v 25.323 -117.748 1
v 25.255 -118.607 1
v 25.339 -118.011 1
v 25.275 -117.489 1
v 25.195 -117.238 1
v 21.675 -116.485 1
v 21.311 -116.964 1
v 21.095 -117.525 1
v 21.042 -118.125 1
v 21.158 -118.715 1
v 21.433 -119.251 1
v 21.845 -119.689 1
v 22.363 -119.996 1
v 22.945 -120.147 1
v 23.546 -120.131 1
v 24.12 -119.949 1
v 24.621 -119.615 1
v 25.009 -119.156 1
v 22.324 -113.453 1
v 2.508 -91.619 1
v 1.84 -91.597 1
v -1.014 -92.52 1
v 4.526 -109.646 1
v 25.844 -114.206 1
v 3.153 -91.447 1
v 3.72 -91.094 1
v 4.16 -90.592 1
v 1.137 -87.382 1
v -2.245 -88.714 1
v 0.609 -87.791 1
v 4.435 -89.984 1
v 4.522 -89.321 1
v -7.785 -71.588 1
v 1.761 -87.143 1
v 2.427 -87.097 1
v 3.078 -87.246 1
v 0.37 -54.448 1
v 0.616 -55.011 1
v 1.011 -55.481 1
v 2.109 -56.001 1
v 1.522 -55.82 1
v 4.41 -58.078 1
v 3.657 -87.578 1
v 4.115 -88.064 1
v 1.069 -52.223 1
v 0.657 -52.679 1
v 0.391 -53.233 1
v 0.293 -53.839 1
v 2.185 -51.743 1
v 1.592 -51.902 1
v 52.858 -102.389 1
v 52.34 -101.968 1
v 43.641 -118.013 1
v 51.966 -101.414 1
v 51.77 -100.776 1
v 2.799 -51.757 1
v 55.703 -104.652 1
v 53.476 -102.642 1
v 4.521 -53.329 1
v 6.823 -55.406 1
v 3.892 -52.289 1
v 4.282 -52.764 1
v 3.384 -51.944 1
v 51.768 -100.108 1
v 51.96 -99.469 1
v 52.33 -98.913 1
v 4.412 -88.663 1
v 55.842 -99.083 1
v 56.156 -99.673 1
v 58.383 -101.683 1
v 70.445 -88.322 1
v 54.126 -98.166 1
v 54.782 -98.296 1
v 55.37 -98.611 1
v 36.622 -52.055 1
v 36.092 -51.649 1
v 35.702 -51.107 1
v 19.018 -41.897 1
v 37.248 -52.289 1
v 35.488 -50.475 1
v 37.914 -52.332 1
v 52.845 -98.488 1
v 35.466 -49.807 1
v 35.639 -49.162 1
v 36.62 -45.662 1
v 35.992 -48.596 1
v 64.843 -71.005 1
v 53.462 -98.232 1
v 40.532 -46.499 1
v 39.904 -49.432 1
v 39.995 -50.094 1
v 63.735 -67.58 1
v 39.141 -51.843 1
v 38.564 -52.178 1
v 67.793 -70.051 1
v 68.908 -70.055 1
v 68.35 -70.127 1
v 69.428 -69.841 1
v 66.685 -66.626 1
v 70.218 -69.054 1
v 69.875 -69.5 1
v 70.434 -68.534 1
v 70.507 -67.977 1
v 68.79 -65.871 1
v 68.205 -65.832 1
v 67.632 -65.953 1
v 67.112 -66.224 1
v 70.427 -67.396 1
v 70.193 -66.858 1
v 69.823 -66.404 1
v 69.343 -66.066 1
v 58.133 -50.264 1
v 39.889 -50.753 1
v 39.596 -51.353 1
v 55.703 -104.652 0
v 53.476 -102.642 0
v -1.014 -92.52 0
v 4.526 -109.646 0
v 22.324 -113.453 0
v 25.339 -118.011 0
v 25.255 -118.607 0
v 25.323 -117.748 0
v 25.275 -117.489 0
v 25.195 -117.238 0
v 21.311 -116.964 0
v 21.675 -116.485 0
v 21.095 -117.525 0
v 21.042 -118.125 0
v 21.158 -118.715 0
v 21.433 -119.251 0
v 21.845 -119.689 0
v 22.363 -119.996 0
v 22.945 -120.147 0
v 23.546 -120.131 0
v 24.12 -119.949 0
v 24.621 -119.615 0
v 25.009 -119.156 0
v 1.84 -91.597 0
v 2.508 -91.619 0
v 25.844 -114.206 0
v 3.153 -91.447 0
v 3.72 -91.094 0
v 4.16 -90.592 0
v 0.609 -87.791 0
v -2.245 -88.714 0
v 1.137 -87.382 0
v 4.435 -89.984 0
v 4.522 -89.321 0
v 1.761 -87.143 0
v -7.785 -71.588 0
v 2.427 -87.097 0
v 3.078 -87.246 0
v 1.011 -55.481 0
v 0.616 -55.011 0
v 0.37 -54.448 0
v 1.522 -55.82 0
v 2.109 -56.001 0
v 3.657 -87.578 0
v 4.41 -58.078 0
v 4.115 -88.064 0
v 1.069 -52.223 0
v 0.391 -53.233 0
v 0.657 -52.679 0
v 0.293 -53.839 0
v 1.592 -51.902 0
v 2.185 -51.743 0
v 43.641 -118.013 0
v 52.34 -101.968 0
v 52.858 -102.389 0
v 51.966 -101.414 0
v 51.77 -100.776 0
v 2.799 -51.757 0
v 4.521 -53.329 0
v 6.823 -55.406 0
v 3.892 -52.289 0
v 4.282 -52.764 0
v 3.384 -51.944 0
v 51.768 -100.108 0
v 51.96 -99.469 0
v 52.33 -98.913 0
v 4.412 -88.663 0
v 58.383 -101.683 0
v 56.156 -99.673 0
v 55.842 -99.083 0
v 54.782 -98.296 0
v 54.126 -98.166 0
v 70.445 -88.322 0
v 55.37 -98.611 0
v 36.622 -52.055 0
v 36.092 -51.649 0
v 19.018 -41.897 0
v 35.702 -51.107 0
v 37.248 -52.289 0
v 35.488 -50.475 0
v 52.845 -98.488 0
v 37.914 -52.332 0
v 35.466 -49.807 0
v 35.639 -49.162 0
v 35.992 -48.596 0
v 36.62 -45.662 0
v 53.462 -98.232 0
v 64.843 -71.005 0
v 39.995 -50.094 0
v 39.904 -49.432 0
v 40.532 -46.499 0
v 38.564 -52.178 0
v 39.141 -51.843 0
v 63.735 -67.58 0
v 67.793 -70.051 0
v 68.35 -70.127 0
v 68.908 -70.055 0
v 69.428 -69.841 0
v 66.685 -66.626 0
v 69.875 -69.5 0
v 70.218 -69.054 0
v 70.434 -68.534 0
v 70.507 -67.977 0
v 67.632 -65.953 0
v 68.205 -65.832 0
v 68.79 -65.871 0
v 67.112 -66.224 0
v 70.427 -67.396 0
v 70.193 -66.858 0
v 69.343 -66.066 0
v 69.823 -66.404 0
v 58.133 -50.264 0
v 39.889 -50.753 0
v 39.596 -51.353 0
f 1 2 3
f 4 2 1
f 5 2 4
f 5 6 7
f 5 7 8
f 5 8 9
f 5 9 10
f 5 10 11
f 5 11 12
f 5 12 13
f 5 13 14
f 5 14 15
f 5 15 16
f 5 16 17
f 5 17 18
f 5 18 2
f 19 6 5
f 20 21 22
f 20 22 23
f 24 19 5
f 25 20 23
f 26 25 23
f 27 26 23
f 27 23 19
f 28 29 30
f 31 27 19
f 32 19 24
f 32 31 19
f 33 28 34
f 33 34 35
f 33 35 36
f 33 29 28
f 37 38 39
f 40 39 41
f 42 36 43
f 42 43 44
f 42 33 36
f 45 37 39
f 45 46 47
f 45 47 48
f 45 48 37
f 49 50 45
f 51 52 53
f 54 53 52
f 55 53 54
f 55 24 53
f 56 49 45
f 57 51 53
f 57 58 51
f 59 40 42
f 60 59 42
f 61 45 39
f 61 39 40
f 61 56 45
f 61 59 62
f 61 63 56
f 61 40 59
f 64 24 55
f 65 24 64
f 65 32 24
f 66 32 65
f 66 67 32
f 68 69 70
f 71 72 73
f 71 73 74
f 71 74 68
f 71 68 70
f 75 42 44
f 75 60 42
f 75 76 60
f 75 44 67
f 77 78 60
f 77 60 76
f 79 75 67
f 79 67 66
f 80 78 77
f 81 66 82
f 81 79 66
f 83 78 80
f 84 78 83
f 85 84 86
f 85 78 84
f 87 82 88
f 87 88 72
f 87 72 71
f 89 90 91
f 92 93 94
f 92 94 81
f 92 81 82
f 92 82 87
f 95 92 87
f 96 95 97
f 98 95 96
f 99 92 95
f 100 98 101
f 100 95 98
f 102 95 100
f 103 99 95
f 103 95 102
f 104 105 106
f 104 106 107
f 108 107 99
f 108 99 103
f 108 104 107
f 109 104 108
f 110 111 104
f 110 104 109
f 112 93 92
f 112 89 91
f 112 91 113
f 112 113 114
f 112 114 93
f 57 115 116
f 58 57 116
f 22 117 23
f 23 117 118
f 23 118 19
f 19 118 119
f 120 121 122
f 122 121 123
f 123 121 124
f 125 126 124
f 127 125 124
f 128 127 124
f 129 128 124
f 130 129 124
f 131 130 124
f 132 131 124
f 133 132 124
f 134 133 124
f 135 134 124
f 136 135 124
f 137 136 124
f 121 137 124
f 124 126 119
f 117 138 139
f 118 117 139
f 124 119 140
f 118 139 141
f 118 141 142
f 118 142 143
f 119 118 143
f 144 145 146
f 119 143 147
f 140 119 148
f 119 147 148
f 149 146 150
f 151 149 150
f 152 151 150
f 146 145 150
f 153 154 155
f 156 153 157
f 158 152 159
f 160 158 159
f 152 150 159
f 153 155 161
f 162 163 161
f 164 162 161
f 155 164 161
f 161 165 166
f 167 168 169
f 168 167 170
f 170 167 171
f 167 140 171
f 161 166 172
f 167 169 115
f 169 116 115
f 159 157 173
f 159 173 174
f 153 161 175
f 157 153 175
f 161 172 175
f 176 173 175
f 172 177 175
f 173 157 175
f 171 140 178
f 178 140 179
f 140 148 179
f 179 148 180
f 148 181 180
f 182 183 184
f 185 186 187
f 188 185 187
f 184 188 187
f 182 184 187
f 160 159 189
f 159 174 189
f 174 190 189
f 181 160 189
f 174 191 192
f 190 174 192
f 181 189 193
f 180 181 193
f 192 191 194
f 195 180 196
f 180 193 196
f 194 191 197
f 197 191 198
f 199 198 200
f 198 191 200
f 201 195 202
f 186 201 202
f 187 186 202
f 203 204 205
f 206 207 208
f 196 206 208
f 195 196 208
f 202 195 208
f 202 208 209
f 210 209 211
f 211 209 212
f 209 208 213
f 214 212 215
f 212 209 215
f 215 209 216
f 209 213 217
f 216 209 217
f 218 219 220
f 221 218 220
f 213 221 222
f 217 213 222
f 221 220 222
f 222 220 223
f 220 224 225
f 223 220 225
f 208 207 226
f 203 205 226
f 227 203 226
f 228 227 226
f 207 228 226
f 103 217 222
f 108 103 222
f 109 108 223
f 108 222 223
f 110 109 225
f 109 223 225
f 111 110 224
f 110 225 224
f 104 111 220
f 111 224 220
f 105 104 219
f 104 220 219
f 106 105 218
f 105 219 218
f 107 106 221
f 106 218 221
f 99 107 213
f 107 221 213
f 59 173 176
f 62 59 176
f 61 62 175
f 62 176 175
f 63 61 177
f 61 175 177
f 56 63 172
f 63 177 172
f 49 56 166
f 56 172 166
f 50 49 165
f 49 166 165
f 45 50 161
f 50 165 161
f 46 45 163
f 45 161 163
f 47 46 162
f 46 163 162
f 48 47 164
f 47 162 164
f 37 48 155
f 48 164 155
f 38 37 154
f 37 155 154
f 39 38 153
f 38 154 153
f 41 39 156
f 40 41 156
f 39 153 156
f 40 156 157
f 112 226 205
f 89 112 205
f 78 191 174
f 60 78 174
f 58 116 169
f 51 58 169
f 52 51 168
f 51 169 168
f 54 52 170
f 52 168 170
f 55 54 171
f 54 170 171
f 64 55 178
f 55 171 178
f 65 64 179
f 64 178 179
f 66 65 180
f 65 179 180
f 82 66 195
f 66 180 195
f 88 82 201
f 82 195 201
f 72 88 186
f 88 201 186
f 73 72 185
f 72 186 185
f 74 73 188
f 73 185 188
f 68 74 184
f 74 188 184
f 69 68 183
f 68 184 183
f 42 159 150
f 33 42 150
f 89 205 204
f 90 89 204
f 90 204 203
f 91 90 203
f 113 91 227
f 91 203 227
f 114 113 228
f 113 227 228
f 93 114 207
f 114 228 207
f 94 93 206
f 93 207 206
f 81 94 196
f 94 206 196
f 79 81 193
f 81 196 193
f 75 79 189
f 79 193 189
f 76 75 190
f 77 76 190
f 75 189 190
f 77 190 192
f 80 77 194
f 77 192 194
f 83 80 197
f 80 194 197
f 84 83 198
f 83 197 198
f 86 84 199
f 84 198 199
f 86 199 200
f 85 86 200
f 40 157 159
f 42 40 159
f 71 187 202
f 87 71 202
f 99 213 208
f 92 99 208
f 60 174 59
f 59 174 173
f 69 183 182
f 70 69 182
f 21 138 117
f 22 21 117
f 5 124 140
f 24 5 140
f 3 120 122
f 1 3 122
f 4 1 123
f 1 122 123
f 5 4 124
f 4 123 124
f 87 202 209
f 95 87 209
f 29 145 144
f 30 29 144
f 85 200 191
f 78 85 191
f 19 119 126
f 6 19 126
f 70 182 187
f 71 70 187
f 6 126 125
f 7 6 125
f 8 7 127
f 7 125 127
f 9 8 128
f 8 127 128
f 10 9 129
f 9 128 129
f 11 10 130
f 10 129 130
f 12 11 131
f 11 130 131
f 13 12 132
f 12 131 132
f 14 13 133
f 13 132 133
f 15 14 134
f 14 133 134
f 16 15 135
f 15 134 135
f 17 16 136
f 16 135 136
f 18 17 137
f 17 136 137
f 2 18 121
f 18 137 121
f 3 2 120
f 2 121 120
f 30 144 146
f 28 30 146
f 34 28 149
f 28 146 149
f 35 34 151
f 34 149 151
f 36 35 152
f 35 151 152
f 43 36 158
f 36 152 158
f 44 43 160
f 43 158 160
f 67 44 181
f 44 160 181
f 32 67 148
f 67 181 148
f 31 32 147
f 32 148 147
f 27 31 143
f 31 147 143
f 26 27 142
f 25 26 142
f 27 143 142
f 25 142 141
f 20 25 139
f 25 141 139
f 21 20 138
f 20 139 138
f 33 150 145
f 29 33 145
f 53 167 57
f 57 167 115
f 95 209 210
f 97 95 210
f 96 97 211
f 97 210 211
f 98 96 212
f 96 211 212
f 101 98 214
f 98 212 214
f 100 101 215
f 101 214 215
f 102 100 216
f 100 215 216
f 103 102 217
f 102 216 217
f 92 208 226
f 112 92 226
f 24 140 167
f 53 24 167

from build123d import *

# Parameters (mm, degrees)
F1_DEPTH = 1


with BuildPart() as f1:
    # F0 (on Top) → F1 (new body)
    with BuildSketch(Plane.XY):
        with BuildLine():
            Line((58.383235, -101.68299), (70.444852, -88.32195))
            Line((70.444852, -88.32195), (64.843104, -71.005472))
            Line((64.843104, -71.005472), (63.735066, -67.580235))
            Line((63.735066, -67.580235), (58.133317, -50.263756))
            Line((58.133317, -50.263756), (40.531509, -46.498609))
            Line((40.531509, -46.498609), (39.903984, -49.432244))
            ThreePointArc((39.903984, -49.432244), (37.247557, -52.289482), (35.992471, -48.595544))
            Line((35.992471, -48.595544), (36.619996, -45.661909))
            Line((36.619996, -45.661909), (19.018187, -41.896762))
            Line((19.018187, -41.896762), (6.822551, -55.406257))
            Line((6.822551, -55.406257), (4.410228, -58.078465))
            Line((4.410228, -58.078465), (-7.785408, -71.587961))
            Line((-7.785408, -71.587961), (-2.245217, -88.714148))
            Line((-2.245217, -88.714148), (0.609147, -87.790783))
            ThreePointArc((0.609147, -87.790783), (4.411802, -88.662697), (1.840301, -91.596602))
            Line((1.840301, -91.596602), (-1.014064, -92.519967))
            Line((-1.014064, -92.519967), (4.526127, -109.646154))
            Line((4.526127, -109.646154), (22.323511, -113.453137))
            Line((22.323511, -113.453137), (25.843873, -114.206166))
            Line((25.843873, -114.206166), (43.641257, -118.013149))
            Line((43.641257, -118.013149), (55.702875, -104.65211))
            Line((55.702875, -104.65211), (53.476035, -102.64184))
            ThreePointArc((53.476035, -102.64184), (52.329808, -98.912687), (56.156395, -99.67272))
            Line((56.156395, -99.67272), (58.383235, -101.68299))
        make_face()
        with BuildLine():
            Line((4.410228, -58.078465), (6.822551, -55.406257))
            Line((6.822551, -55.406257), (4.521484, -53.328979))
            ThreePointArc((4.521484, -53.328979), (4.57471, -53.600792), (4.592551, -53.877193))
            ThreePointArc((4.592551, -53.877193), (3.839997, -55.511097), (2.10916, -56.001187))
            Line((2.10916, -56.001187), (4.410228, -58.078465))
        make_face()
        with BuildLine():
            ThreePointArc((4.592551, -53.877193), (4.57471, -53.600792), (4.521484, -53.328979))
            ThreePointArc((4.521484, -53.328979), (0.846649, -52.436499), (2.10916, -56.001187))
            ThreePointArc((2.10916, -56.001187), (3.839997, -55.511097), (4.592551, -53.877193))
        make_face()
        with BuildLine():
            ThreePointArc((66.684576, -66.626091), (66.311685, -68.638558), (67.792614, -70.051328))
            ThreePointArc((67.792614, -70.051328), (69.662763, -69.685116), (70.507313, -67.976813))
            ThreePointArc((70.507313, -67.976813), (69.073593, -65.949636), (66.684576, -66.626091))
        make_face()
        with BuildLine():
            Line((63.735066, -67.580235), (64.843104, -71.005472))
            Line((64.843104, -71.005472), (67.792614, -70.051328))
            ThreePointArc((67.792614, -70.051328), (66.311685, -68.638558), (66.684576, -66.626091))
            Line((66.684576, -66.626091), (63.735066, -67.580235))
        make_face()
        with BuildLine():
            Line((25.195431, -117.237589), (25.843873, -114.206166))
            Line((25.843873, -114.206166), (22.323511, -113.453137))
            Line((22.323511, -113.453137), (21.675069, -116.48456))
            ThreePointArc((21.675069, -116.48456), (23.639029, -115.908423), (25.195431, -117.237589))
        make_face()
        with BuildLine():
            ThreePointArc((25.339303, -118.010861), (25.303029, -117.61759), (25.195431, -117.237589))
            ThreePointArc((25.195431, -117.237589), (23.639029, -115.908423), (21.675069, -116.48456))
            ThreePointArc((21.675069, -116.48456), (22.362593, -119.995565), (25.339303, -118.010861))
        make_face()
    extrude(amount=F1_DEPTH)


solid = f1.part
